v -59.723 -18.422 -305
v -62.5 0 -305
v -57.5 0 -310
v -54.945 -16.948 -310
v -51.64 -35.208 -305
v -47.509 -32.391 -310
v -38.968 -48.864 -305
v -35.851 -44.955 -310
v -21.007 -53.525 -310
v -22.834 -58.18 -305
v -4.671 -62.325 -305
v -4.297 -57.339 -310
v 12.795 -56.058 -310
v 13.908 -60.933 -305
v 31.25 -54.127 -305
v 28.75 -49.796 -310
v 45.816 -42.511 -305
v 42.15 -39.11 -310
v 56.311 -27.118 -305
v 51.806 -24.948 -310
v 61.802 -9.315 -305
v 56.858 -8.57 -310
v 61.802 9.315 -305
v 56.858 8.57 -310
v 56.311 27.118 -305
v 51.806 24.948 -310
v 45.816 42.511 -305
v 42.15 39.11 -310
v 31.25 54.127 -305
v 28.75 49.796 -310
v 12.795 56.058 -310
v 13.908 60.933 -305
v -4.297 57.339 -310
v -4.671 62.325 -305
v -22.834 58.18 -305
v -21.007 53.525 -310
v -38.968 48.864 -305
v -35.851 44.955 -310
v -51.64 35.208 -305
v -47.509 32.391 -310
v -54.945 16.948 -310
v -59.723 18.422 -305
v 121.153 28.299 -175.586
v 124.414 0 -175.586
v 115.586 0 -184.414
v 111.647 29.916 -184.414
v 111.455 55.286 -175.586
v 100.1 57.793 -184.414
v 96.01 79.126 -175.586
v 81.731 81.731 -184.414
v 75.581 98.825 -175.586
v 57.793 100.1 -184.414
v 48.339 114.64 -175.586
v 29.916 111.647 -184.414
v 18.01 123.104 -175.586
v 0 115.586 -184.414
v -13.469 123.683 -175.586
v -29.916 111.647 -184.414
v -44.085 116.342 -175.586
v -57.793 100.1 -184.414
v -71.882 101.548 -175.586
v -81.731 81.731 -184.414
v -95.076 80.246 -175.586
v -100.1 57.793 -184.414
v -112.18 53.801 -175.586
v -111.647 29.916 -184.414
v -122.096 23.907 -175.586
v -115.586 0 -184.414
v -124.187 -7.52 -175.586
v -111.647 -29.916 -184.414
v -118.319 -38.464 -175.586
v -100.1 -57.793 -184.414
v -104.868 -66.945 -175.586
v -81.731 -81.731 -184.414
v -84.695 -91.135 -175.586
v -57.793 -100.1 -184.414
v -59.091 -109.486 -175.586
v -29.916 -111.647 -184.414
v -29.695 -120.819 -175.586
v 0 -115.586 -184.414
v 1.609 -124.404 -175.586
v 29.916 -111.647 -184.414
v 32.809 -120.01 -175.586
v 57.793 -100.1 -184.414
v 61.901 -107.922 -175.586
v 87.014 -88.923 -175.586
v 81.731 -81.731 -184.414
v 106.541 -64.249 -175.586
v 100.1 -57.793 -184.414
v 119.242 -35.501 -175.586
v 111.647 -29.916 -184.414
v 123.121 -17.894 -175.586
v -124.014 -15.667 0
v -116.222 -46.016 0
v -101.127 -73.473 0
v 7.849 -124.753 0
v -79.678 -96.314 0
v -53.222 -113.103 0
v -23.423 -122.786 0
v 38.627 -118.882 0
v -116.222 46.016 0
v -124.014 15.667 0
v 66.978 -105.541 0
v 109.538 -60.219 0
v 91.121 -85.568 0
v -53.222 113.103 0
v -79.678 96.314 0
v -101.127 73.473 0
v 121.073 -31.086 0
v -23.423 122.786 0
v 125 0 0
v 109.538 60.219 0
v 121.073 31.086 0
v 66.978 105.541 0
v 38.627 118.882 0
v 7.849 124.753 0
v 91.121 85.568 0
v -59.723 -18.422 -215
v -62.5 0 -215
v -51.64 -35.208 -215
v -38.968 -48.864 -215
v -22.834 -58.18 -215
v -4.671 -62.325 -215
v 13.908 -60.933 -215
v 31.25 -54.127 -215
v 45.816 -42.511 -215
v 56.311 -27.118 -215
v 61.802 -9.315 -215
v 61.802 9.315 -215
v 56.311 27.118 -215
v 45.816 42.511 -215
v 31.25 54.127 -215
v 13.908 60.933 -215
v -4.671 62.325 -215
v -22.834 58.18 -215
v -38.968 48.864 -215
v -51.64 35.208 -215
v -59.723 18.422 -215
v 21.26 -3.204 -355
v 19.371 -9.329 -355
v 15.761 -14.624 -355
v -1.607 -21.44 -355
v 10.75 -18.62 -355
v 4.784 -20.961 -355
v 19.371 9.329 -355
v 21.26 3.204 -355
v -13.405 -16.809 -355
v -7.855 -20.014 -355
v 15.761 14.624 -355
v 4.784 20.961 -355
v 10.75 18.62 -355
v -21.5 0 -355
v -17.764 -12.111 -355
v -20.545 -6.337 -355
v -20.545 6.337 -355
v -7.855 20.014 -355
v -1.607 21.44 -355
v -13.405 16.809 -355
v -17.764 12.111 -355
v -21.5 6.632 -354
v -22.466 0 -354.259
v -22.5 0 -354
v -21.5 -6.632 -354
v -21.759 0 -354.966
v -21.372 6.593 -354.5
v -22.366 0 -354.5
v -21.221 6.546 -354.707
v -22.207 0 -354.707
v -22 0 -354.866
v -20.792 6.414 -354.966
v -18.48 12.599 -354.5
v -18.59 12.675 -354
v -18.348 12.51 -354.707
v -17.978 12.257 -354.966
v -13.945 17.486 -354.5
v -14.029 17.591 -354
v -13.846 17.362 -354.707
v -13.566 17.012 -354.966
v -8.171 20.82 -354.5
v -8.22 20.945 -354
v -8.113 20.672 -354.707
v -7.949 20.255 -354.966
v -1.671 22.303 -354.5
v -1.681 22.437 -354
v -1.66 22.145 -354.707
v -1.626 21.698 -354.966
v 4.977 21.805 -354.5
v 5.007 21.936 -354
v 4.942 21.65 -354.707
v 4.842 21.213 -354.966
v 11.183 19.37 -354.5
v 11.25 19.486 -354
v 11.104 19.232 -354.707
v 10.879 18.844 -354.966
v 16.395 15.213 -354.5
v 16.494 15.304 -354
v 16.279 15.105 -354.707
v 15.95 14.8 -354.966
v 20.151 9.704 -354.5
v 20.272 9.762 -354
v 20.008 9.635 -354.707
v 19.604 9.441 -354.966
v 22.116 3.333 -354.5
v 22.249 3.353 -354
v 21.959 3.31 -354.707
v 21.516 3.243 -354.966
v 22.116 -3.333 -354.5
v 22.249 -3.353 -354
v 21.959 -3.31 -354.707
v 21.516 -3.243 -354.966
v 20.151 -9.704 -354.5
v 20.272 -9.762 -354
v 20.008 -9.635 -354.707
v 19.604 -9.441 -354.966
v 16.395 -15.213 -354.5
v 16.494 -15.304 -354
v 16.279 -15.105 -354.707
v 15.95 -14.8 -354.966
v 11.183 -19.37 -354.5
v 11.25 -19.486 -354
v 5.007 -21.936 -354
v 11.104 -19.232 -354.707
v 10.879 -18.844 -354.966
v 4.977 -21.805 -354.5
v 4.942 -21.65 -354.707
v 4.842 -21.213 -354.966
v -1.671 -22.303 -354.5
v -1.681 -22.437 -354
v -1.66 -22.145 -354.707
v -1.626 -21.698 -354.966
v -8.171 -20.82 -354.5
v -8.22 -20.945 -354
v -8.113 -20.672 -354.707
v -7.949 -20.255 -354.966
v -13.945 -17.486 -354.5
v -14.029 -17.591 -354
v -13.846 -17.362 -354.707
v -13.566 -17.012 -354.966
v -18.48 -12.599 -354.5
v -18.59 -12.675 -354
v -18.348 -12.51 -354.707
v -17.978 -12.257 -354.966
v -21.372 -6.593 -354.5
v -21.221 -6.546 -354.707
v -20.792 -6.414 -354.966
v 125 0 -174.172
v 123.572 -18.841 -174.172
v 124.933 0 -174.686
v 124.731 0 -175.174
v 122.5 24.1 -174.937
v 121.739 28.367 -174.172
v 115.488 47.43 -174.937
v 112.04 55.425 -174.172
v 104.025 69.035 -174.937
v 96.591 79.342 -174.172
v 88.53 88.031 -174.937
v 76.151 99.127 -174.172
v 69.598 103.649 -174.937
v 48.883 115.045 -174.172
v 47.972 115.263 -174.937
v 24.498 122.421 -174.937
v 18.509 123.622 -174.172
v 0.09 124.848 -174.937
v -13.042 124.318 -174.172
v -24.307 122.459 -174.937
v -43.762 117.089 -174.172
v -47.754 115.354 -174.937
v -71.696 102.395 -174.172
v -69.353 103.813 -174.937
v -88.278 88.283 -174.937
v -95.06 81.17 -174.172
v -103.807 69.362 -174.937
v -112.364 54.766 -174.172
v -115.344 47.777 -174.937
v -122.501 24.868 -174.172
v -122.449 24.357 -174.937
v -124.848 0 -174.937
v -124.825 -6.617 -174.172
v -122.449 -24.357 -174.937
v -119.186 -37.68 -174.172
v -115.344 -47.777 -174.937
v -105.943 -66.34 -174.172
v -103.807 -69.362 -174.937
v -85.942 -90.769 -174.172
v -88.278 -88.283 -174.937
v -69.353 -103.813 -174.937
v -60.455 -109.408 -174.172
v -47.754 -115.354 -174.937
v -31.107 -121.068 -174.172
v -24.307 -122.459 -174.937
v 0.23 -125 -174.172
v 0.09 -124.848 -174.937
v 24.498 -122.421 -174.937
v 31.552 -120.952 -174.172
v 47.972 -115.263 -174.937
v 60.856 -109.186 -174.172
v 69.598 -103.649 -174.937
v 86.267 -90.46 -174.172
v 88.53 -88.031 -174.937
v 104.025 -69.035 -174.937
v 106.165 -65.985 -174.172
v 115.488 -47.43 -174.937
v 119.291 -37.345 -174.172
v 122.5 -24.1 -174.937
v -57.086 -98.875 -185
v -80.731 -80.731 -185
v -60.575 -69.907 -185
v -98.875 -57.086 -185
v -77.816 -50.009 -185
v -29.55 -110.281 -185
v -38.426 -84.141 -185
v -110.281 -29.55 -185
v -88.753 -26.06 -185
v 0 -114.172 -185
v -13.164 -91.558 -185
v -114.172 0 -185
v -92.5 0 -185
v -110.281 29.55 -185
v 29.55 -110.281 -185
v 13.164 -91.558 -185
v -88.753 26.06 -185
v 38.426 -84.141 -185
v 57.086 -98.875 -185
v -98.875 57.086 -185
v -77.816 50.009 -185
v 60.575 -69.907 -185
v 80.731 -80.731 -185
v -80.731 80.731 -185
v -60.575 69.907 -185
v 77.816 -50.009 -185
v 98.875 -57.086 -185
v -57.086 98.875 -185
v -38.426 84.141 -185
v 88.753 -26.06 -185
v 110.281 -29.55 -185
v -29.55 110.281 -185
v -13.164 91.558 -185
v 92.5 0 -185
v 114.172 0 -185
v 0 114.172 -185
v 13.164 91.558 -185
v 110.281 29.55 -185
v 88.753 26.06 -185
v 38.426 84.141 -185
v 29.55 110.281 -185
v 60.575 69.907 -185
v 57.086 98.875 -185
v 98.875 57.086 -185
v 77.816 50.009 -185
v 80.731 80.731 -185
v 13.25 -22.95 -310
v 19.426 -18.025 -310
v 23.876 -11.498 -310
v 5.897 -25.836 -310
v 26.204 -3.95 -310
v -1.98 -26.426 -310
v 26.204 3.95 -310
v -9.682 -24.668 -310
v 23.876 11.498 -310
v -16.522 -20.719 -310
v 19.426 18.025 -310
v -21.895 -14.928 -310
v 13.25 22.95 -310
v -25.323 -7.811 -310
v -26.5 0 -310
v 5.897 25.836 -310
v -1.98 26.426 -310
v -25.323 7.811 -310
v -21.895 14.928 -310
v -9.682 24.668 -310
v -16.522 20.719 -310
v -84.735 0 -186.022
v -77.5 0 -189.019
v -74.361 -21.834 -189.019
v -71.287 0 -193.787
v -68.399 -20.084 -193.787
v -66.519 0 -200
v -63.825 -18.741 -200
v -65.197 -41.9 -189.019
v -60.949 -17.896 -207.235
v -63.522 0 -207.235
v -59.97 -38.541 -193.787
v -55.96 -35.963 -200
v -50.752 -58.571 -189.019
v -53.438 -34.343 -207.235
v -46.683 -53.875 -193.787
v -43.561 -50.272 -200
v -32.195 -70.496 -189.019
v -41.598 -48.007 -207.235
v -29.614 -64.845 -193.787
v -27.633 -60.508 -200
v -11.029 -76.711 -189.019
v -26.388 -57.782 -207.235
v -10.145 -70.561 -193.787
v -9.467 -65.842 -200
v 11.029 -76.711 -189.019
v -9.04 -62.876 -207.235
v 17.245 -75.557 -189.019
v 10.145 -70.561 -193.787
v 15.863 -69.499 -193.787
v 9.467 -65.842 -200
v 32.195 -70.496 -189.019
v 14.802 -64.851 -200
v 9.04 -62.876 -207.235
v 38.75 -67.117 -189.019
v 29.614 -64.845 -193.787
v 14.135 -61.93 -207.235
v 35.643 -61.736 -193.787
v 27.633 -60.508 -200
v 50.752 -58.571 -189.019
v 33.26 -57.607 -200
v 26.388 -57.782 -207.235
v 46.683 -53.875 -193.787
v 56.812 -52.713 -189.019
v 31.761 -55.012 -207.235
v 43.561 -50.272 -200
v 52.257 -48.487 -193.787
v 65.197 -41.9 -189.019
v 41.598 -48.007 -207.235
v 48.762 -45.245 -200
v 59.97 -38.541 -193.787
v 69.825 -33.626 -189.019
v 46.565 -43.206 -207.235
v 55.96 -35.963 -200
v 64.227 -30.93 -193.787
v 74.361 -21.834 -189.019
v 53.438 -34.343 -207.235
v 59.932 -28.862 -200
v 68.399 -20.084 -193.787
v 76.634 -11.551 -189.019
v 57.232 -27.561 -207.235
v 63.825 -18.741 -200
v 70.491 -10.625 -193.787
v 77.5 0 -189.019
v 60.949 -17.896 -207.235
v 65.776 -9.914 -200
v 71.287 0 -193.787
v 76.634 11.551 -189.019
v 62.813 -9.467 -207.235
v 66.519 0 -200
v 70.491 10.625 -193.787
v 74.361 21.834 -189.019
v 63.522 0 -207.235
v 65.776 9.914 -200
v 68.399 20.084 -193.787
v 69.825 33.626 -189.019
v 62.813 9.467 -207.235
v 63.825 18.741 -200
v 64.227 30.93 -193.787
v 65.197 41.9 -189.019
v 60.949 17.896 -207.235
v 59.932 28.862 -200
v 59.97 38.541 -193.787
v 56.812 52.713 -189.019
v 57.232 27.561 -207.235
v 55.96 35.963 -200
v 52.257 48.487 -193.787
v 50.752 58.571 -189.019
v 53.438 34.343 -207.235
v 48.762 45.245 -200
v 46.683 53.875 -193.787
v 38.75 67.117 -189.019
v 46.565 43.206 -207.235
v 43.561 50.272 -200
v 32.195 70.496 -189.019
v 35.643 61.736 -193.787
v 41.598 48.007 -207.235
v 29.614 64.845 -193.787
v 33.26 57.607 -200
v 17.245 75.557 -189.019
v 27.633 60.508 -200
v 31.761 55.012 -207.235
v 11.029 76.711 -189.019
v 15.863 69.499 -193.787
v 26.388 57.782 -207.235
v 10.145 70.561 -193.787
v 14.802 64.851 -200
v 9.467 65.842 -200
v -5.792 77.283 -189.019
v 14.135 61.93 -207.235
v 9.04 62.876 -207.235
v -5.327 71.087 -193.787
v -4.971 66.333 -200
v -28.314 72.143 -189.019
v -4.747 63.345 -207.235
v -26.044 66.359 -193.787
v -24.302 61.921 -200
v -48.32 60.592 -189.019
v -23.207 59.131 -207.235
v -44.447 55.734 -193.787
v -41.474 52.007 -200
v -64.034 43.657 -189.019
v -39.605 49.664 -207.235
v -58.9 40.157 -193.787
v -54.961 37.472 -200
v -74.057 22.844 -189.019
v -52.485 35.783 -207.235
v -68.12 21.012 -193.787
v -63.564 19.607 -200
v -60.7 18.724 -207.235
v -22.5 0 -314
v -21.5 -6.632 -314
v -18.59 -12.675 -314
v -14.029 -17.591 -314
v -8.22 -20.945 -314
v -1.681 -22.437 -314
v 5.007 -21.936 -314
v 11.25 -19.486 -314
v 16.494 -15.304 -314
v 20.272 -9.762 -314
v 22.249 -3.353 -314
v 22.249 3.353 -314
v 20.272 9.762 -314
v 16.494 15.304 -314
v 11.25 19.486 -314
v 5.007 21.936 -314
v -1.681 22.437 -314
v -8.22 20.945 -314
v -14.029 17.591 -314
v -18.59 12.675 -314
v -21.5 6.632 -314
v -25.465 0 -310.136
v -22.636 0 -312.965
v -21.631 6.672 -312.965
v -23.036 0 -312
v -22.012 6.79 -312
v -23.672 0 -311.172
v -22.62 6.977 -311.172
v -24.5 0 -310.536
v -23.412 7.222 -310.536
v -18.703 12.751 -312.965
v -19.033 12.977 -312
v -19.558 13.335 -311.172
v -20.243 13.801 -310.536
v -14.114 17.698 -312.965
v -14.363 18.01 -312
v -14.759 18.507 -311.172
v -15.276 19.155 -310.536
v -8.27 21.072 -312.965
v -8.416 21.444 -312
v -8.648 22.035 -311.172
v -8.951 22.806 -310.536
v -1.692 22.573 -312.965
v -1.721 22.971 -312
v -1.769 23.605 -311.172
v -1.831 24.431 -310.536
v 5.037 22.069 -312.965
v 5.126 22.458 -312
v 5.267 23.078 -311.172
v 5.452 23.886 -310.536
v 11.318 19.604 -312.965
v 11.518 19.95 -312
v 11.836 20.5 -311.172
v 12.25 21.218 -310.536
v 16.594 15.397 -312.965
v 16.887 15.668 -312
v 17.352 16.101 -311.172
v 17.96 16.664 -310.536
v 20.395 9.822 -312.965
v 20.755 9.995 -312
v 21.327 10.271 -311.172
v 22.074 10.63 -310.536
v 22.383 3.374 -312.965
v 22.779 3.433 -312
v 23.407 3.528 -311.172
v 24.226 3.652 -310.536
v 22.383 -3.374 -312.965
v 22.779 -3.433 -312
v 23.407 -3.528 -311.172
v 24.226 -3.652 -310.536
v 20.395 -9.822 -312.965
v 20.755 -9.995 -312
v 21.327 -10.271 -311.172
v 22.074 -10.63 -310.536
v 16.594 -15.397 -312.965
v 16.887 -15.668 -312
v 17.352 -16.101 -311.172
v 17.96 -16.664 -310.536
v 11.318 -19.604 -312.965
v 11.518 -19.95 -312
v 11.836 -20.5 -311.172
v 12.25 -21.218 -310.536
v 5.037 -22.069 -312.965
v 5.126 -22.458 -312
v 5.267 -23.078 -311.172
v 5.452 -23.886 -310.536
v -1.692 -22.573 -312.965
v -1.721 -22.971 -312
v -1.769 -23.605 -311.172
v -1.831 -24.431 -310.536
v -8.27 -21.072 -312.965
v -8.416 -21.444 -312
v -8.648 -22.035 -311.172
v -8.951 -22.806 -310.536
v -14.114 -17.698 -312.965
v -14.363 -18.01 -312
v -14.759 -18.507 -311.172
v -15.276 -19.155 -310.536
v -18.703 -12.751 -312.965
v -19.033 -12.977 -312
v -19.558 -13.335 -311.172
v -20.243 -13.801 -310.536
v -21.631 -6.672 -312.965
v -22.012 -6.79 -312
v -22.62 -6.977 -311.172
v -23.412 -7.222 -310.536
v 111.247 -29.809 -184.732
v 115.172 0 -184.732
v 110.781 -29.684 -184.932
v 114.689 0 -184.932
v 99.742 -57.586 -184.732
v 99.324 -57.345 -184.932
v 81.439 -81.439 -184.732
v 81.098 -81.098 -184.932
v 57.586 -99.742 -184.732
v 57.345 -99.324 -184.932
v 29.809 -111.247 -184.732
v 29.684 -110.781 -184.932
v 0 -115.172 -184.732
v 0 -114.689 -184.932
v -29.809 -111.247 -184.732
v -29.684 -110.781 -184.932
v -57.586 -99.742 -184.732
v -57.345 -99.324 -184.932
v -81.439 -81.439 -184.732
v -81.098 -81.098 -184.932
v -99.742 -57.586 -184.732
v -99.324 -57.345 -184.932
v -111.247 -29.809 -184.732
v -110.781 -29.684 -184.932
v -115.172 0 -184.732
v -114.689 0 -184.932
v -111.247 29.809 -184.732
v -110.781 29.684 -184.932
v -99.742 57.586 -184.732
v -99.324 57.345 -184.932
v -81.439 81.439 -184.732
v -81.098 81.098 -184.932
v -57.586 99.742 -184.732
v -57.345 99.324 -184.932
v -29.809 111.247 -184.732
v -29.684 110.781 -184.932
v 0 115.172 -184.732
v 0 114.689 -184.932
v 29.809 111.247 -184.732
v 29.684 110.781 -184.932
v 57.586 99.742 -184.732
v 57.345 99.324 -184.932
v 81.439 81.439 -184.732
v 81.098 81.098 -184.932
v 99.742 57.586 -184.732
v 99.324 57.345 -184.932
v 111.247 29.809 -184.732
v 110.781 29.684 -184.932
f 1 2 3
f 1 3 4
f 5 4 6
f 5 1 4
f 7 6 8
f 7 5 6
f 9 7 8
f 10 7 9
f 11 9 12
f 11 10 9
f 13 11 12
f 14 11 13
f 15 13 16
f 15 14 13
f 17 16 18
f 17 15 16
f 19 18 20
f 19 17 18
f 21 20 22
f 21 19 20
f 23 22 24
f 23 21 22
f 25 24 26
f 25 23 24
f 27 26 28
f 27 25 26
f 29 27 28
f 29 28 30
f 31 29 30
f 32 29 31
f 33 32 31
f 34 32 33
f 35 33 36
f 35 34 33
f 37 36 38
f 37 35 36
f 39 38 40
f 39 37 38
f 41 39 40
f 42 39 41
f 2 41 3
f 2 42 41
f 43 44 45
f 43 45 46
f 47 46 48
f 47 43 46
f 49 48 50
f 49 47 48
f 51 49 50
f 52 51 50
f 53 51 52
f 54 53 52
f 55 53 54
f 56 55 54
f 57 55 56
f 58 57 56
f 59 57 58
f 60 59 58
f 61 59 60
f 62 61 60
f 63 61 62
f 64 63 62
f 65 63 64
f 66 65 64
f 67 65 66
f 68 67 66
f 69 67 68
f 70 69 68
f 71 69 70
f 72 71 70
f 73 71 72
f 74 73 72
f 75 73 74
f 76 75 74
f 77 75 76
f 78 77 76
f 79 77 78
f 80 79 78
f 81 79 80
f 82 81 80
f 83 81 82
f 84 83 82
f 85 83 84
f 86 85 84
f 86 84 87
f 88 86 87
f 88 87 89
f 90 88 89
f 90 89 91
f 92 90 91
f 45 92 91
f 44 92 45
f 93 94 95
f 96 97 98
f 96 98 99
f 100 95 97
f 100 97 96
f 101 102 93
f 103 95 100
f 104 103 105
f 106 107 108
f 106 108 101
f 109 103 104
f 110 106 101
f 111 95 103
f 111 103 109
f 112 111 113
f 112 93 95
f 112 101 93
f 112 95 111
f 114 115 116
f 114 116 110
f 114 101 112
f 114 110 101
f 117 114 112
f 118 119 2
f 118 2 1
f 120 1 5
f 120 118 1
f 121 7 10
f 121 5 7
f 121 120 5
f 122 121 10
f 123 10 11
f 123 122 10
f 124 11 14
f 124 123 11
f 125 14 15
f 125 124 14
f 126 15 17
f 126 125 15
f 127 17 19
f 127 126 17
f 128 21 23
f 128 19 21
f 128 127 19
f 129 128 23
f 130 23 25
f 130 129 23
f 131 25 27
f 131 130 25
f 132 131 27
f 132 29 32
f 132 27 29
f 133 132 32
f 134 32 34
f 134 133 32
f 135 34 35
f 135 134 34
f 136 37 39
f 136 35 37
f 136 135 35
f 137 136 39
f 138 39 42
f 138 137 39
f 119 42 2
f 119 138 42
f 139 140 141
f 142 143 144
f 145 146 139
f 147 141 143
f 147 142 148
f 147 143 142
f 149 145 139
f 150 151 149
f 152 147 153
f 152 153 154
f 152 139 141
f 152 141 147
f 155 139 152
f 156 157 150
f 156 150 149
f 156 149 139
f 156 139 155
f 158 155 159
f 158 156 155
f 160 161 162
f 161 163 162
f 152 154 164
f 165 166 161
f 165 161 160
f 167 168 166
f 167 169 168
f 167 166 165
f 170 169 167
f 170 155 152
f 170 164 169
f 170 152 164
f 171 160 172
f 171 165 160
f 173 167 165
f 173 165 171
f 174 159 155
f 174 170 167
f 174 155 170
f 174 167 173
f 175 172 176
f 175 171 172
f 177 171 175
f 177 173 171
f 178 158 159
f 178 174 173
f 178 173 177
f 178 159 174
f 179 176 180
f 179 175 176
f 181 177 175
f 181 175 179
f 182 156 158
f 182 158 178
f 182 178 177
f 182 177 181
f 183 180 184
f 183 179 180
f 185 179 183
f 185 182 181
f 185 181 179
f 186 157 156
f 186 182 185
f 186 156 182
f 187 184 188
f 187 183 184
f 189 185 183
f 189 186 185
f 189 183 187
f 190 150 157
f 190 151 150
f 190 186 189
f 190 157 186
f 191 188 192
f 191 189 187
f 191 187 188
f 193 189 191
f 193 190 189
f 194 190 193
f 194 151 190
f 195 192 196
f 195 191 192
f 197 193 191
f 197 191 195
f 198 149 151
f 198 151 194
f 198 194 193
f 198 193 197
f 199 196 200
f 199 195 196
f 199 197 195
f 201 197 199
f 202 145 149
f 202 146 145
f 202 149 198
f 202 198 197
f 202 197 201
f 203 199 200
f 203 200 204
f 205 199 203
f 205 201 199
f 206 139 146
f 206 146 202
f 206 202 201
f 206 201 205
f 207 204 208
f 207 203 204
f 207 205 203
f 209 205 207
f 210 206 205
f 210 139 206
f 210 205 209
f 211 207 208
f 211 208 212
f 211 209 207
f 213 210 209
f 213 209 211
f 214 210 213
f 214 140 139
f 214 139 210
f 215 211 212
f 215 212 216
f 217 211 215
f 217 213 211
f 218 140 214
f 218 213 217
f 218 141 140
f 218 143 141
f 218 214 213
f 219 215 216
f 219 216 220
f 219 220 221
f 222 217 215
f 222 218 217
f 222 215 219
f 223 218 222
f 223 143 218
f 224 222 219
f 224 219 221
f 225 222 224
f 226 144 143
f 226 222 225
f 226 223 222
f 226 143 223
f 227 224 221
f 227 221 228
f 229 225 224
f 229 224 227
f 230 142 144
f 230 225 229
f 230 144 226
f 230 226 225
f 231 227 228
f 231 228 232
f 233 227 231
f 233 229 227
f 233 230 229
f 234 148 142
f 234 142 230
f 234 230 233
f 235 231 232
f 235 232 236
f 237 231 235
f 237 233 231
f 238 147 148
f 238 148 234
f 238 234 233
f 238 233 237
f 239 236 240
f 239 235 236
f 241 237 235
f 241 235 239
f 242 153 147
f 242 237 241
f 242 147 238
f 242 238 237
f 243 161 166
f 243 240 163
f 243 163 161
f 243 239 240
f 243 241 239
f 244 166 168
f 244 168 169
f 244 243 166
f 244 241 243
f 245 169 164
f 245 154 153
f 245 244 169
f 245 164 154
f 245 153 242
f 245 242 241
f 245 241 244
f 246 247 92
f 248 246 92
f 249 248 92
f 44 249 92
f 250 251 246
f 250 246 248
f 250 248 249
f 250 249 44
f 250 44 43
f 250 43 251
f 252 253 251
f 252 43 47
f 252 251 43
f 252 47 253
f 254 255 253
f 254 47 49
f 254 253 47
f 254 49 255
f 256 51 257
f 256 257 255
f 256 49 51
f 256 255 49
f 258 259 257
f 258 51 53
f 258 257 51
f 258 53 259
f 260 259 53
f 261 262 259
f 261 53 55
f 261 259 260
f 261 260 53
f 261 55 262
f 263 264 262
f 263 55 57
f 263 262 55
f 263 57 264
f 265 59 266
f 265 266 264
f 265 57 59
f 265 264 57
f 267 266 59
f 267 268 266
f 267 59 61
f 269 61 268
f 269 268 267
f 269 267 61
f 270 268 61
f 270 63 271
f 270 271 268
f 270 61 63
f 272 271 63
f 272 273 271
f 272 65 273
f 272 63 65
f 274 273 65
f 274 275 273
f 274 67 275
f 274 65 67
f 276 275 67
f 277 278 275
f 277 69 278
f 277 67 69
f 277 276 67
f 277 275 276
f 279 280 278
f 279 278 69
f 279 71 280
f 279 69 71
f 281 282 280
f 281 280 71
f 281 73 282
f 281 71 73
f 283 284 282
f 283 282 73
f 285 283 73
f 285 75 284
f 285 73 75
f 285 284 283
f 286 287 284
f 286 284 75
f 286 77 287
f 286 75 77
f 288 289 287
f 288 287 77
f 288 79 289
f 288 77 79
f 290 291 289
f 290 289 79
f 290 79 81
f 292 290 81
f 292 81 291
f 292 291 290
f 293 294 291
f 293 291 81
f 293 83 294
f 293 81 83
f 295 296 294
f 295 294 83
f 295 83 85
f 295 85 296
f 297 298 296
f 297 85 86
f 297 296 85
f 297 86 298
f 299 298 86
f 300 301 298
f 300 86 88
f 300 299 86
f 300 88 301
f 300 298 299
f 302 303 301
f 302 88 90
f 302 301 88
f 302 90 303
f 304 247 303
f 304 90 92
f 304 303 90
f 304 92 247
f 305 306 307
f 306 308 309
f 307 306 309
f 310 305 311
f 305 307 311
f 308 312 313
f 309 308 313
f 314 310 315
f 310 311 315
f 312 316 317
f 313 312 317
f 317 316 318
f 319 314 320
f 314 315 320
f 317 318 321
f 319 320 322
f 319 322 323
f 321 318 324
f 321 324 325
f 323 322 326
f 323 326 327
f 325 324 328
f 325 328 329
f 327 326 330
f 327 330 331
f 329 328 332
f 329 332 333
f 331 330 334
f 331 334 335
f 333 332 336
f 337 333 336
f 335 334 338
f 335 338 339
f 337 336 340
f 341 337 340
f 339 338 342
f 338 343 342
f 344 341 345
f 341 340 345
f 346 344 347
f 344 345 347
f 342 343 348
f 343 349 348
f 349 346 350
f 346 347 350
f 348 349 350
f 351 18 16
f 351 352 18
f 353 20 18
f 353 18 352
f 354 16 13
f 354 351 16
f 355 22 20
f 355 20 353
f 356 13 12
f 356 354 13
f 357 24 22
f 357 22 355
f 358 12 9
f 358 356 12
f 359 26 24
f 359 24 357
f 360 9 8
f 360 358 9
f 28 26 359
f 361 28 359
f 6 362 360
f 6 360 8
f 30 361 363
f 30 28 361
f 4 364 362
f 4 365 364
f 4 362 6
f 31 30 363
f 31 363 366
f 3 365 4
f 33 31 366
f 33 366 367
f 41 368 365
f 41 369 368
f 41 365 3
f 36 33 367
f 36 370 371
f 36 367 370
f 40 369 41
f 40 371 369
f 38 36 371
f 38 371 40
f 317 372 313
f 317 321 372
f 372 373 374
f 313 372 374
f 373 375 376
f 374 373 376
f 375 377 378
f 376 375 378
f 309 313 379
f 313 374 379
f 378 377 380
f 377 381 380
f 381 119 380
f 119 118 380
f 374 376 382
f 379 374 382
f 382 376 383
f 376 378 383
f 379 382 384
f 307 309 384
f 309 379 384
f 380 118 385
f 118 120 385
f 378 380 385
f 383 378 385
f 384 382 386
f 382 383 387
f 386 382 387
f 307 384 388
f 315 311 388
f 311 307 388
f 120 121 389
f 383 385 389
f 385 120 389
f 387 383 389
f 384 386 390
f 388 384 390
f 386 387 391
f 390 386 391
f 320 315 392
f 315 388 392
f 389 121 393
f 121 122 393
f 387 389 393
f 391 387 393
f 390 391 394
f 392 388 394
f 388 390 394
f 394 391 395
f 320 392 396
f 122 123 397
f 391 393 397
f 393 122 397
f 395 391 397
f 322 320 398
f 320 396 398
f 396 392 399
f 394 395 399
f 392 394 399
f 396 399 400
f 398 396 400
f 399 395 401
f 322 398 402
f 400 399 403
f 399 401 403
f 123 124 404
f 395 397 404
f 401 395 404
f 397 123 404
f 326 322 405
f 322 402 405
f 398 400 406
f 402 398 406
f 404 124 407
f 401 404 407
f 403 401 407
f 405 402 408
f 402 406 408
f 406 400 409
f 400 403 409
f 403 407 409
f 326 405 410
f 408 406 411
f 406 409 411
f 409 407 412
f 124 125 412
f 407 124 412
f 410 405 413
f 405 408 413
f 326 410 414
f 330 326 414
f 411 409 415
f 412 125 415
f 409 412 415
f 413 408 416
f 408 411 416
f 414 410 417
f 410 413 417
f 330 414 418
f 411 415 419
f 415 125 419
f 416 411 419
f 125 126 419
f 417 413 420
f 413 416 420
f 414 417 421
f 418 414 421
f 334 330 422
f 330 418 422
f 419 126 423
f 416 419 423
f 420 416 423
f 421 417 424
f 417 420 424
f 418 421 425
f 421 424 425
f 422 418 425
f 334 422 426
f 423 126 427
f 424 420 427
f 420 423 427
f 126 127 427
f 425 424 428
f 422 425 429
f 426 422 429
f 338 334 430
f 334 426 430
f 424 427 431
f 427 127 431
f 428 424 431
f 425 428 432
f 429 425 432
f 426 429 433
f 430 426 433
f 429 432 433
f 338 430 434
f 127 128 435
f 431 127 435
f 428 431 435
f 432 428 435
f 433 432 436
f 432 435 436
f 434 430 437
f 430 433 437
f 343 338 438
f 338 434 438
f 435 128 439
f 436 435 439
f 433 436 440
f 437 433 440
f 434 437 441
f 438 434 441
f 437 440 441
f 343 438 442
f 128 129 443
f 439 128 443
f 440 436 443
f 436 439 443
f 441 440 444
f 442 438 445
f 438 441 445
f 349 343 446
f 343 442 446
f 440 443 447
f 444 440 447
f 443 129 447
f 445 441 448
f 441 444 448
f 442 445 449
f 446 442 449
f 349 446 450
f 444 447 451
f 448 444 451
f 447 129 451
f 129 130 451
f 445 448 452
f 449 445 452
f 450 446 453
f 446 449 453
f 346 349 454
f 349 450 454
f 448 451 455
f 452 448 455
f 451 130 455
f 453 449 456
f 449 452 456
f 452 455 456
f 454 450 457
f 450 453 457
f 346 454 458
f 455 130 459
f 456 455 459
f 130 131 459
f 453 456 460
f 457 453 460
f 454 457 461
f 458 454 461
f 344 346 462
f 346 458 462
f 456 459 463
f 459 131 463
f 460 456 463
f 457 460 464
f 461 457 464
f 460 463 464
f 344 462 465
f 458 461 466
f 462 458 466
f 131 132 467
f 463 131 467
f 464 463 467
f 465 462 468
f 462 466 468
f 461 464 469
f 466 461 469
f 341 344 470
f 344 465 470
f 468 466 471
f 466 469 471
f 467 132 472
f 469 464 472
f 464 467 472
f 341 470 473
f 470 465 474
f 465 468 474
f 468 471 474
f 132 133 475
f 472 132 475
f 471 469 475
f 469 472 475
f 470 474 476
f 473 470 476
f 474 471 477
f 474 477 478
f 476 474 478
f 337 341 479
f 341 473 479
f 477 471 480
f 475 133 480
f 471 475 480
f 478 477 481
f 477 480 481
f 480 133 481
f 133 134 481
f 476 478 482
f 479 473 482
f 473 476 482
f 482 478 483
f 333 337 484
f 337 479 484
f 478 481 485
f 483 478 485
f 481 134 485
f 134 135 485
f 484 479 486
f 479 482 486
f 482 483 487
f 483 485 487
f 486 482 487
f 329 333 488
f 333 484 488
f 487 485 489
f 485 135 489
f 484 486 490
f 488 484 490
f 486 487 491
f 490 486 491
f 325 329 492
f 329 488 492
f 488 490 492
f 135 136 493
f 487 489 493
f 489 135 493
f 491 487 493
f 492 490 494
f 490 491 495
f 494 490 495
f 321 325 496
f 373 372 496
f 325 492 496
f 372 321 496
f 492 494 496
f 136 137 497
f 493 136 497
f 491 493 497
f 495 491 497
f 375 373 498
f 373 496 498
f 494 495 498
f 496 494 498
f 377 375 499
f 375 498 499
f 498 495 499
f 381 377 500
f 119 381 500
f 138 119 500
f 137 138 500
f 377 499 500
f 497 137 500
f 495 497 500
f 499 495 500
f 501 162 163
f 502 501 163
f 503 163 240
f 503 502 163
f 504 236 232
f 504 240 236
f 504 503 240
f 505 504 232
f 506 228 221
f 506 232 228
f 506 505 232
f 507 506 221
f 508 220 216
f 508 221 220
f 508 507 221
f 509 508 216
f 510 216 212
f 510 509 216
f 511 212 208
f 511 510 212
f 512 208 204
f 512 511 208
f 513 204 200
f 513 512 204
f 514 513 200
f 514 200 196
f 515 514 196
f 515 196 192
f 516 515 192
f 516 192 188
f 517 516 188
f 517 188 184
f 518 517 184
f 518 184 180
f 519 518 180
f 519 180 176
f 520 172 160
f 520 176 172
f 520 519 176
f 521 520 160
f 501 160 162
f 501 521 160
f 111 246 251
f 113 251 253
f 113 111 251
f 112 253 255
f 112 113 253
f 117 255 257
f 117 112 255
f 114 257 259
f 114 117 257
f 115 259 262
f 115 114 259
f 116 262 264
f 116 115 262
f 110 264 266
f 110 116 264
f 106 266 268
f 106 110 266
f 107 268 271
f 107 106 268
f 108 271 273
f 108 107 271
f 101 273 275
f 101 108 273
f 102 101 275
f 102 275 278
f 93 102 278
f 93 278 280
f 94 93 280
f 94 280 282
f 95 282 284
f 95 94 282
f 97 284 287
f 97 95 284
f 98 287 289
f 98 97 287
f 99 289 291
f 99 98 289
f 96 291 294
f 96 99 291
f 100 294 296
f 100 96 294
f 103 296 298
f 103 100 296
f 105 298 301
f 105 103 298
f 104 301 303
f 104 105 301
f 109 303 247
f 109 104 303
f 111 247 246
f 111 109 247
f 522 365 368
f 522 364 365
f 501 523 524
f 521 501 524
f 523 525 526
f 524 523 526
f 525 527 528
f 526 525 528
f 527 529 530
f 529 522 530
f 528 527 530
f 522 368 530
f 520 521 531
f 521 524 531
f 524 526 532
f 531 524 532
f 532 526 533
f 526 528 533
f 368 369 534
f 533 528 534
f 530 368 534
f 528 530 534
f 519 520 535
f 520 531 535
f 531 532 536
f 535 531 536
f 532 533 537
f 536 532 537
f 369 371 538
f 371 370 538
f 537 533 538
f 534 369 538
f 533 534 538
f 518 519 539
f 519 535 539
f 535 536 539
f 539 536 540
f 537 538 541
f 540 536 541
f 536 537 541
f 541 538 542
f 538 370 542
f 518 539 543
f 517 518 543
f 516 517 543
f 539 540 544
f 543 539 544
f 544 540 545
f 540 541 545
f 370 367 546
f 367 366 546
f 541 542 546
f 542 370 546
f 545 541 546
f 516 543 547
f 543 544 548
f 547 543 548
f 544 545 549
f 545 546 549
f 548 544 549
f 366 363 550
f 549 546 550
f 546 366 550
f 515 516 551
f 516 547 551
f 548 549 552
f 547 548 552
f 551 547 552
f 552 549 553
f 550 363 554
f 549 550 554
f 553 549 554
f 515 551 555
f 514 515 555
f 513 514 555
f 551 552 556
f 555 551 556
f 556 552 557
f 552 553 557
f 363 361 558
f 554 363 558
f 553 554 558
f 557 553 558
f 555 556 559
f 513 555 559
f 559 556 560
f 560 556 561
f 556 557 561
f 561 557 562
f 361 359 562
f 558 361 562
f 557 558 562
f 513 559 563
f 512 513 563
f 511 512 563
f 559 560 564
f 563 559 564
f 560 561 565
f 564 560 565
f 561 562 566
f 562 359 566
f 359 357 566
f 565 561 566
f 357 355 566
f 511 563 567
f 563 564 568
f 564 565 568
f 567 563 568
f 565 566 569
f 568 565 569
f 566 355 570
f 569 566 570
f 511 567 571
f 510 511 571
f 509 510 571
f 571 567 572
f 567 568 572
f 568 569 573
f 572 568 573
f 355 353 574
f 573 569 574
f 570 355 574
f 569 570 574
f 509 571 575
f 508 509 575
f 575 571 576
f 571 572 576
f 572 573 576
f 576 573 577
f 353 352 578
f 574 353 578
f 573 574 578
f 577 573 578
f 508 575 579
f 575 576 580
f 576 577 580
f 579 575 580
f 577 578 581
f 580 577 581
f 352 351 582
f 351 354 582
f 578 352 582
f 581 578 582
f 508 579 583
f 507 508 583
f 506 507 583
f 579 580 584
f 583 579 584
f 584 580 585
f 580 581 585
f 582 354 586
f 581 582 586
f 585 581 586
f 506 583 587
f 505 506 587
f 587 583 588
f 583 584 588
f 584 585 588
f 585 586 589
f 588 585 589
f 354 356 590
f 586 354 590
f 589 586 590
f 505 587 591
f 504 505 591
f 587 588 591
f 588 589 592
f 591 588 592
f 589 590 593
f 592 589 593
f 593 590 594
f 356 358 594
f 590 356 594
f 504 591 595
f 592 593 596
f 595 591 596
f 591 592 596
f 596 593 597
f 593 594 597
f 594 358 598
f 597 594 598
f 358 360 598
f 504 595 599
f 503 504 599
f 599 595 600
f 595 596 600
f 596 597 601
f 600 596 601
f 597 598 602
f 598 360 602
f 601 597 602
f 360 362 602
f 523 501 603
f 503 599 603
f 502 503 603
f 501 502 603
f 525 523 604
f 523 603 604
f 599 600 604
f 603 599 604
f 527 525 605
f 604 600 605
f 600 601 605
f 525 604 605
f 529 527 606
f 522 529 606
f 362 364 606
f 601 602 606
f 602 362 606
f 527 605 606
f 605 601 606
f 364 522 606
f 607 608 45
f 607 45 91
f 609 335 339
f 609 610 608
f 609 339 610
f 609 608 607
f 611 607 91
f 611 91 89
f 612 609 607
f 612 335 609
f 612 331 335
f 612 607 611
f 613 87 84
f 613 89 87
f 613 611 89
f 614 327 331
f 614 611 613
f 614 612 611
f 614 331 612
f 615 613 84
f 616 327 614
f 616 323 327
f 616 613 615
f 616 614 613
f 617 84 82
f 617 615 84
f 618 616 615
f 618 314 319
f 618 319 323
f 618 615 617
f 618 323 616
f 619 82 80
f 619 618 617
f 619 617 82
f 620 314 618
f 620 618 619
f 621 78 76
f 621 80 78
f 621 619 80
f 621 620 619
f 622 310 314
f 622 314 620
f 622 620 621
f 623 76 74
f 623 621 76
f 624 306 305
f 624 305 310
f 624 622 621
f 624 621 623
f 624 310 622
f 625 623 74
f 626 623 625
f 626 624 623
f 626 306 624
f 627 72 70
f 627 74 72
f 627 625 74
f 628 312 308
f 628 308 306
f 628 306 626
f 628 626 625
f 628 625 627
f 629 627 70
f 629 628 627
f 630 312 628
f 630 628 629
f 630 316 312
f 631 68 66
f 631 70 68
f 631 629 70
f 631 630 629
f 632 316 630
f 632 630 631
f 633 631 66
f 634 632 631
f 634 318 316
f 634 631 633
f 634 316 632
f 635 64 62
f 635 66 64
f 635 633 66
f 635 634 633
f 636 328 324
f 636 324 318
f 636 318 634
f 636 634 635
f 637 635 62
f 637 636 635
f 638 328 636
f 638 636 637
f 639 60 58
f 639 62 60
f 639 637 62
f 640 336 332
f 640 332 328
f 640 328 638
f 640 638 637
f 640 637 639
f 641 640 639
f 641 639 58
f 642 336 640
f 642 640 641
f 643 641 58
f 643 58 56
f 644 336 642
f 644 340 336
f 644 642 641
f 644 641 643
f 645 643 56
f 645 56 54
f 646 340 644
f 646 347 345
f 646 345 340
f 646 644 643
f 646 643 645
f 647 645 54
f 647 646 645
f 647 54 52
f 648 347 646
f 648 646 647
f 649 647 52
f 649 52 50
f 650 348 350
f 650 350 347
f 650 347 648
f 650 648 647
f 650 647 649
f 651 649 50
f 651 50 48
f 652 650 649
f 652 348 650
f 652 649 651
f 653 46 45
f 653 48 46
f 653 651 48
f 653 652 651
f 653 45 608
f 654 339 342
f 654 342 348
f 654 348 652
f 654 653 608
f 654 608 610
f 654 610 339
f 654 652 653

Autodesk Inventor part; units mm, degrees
ref_plane "YZ Plane" through (0, 0, 0) normal (1, 0, 0) x (0, 1, 0)
ref_plane "XZ Plane" through (0, 0, 0) normal (0, 1, 0) x (-1, 0, 0)
ref_plane "XY Plane" through (0, 0, 0) normal (0, 0, 1) x (1, 0, 0)
sketch "Boceto1" plane through (0, 0, 0) normal (0, 0, 1) x (1, 0, 0)
  circle A0 centre (0, 0) radius 125
  dimension "d0" = 250
extrude "Extrusión1" add sketch "Boceto1" against normal blind 185
sketch "Boceto2" plane through (0, 0, -185) normal (0, 0, -1) x (-1, 0, 0)
  circle A0 centre (0, 0) radius 62.5
  dimension "d3" = 125
extrude "Extrusión2" add sketch "Boceto2" along normal blind 125
sketch "Boceto3" plane through (0, 0, -310) normal (0, 0, -1) x (-1, 0, 0)
  circle A0 centre (0, 0) radius 22.5
  dimension "d6" = 45
extrude "Extrusión3" add sketch "Boceto3" along normal blind 45
chamfer "Chaflán1" distance 10 angle 45 1 edges at (-125, 0, -185)
fillet "Empalme1" radius 2 2 edges at (-125, 0, -175) (-115, 0, -185)
fillet "Empalme de cara1" radius 30 1 edges at (62.5, 0, -185)
chamfer "Chaflán2" distance 5 angle 45 1 edges at (62.5, 0, -310)
fillet "Empalme2" radius 1 1 edges at (22.5, 0, -355)
fillet "Empalme de cara2" radius 4 1 edges at (22.5, 0, -310)
equation "\"d3\" = 0.5 * d0"
properties part number "eje (bolt)"
